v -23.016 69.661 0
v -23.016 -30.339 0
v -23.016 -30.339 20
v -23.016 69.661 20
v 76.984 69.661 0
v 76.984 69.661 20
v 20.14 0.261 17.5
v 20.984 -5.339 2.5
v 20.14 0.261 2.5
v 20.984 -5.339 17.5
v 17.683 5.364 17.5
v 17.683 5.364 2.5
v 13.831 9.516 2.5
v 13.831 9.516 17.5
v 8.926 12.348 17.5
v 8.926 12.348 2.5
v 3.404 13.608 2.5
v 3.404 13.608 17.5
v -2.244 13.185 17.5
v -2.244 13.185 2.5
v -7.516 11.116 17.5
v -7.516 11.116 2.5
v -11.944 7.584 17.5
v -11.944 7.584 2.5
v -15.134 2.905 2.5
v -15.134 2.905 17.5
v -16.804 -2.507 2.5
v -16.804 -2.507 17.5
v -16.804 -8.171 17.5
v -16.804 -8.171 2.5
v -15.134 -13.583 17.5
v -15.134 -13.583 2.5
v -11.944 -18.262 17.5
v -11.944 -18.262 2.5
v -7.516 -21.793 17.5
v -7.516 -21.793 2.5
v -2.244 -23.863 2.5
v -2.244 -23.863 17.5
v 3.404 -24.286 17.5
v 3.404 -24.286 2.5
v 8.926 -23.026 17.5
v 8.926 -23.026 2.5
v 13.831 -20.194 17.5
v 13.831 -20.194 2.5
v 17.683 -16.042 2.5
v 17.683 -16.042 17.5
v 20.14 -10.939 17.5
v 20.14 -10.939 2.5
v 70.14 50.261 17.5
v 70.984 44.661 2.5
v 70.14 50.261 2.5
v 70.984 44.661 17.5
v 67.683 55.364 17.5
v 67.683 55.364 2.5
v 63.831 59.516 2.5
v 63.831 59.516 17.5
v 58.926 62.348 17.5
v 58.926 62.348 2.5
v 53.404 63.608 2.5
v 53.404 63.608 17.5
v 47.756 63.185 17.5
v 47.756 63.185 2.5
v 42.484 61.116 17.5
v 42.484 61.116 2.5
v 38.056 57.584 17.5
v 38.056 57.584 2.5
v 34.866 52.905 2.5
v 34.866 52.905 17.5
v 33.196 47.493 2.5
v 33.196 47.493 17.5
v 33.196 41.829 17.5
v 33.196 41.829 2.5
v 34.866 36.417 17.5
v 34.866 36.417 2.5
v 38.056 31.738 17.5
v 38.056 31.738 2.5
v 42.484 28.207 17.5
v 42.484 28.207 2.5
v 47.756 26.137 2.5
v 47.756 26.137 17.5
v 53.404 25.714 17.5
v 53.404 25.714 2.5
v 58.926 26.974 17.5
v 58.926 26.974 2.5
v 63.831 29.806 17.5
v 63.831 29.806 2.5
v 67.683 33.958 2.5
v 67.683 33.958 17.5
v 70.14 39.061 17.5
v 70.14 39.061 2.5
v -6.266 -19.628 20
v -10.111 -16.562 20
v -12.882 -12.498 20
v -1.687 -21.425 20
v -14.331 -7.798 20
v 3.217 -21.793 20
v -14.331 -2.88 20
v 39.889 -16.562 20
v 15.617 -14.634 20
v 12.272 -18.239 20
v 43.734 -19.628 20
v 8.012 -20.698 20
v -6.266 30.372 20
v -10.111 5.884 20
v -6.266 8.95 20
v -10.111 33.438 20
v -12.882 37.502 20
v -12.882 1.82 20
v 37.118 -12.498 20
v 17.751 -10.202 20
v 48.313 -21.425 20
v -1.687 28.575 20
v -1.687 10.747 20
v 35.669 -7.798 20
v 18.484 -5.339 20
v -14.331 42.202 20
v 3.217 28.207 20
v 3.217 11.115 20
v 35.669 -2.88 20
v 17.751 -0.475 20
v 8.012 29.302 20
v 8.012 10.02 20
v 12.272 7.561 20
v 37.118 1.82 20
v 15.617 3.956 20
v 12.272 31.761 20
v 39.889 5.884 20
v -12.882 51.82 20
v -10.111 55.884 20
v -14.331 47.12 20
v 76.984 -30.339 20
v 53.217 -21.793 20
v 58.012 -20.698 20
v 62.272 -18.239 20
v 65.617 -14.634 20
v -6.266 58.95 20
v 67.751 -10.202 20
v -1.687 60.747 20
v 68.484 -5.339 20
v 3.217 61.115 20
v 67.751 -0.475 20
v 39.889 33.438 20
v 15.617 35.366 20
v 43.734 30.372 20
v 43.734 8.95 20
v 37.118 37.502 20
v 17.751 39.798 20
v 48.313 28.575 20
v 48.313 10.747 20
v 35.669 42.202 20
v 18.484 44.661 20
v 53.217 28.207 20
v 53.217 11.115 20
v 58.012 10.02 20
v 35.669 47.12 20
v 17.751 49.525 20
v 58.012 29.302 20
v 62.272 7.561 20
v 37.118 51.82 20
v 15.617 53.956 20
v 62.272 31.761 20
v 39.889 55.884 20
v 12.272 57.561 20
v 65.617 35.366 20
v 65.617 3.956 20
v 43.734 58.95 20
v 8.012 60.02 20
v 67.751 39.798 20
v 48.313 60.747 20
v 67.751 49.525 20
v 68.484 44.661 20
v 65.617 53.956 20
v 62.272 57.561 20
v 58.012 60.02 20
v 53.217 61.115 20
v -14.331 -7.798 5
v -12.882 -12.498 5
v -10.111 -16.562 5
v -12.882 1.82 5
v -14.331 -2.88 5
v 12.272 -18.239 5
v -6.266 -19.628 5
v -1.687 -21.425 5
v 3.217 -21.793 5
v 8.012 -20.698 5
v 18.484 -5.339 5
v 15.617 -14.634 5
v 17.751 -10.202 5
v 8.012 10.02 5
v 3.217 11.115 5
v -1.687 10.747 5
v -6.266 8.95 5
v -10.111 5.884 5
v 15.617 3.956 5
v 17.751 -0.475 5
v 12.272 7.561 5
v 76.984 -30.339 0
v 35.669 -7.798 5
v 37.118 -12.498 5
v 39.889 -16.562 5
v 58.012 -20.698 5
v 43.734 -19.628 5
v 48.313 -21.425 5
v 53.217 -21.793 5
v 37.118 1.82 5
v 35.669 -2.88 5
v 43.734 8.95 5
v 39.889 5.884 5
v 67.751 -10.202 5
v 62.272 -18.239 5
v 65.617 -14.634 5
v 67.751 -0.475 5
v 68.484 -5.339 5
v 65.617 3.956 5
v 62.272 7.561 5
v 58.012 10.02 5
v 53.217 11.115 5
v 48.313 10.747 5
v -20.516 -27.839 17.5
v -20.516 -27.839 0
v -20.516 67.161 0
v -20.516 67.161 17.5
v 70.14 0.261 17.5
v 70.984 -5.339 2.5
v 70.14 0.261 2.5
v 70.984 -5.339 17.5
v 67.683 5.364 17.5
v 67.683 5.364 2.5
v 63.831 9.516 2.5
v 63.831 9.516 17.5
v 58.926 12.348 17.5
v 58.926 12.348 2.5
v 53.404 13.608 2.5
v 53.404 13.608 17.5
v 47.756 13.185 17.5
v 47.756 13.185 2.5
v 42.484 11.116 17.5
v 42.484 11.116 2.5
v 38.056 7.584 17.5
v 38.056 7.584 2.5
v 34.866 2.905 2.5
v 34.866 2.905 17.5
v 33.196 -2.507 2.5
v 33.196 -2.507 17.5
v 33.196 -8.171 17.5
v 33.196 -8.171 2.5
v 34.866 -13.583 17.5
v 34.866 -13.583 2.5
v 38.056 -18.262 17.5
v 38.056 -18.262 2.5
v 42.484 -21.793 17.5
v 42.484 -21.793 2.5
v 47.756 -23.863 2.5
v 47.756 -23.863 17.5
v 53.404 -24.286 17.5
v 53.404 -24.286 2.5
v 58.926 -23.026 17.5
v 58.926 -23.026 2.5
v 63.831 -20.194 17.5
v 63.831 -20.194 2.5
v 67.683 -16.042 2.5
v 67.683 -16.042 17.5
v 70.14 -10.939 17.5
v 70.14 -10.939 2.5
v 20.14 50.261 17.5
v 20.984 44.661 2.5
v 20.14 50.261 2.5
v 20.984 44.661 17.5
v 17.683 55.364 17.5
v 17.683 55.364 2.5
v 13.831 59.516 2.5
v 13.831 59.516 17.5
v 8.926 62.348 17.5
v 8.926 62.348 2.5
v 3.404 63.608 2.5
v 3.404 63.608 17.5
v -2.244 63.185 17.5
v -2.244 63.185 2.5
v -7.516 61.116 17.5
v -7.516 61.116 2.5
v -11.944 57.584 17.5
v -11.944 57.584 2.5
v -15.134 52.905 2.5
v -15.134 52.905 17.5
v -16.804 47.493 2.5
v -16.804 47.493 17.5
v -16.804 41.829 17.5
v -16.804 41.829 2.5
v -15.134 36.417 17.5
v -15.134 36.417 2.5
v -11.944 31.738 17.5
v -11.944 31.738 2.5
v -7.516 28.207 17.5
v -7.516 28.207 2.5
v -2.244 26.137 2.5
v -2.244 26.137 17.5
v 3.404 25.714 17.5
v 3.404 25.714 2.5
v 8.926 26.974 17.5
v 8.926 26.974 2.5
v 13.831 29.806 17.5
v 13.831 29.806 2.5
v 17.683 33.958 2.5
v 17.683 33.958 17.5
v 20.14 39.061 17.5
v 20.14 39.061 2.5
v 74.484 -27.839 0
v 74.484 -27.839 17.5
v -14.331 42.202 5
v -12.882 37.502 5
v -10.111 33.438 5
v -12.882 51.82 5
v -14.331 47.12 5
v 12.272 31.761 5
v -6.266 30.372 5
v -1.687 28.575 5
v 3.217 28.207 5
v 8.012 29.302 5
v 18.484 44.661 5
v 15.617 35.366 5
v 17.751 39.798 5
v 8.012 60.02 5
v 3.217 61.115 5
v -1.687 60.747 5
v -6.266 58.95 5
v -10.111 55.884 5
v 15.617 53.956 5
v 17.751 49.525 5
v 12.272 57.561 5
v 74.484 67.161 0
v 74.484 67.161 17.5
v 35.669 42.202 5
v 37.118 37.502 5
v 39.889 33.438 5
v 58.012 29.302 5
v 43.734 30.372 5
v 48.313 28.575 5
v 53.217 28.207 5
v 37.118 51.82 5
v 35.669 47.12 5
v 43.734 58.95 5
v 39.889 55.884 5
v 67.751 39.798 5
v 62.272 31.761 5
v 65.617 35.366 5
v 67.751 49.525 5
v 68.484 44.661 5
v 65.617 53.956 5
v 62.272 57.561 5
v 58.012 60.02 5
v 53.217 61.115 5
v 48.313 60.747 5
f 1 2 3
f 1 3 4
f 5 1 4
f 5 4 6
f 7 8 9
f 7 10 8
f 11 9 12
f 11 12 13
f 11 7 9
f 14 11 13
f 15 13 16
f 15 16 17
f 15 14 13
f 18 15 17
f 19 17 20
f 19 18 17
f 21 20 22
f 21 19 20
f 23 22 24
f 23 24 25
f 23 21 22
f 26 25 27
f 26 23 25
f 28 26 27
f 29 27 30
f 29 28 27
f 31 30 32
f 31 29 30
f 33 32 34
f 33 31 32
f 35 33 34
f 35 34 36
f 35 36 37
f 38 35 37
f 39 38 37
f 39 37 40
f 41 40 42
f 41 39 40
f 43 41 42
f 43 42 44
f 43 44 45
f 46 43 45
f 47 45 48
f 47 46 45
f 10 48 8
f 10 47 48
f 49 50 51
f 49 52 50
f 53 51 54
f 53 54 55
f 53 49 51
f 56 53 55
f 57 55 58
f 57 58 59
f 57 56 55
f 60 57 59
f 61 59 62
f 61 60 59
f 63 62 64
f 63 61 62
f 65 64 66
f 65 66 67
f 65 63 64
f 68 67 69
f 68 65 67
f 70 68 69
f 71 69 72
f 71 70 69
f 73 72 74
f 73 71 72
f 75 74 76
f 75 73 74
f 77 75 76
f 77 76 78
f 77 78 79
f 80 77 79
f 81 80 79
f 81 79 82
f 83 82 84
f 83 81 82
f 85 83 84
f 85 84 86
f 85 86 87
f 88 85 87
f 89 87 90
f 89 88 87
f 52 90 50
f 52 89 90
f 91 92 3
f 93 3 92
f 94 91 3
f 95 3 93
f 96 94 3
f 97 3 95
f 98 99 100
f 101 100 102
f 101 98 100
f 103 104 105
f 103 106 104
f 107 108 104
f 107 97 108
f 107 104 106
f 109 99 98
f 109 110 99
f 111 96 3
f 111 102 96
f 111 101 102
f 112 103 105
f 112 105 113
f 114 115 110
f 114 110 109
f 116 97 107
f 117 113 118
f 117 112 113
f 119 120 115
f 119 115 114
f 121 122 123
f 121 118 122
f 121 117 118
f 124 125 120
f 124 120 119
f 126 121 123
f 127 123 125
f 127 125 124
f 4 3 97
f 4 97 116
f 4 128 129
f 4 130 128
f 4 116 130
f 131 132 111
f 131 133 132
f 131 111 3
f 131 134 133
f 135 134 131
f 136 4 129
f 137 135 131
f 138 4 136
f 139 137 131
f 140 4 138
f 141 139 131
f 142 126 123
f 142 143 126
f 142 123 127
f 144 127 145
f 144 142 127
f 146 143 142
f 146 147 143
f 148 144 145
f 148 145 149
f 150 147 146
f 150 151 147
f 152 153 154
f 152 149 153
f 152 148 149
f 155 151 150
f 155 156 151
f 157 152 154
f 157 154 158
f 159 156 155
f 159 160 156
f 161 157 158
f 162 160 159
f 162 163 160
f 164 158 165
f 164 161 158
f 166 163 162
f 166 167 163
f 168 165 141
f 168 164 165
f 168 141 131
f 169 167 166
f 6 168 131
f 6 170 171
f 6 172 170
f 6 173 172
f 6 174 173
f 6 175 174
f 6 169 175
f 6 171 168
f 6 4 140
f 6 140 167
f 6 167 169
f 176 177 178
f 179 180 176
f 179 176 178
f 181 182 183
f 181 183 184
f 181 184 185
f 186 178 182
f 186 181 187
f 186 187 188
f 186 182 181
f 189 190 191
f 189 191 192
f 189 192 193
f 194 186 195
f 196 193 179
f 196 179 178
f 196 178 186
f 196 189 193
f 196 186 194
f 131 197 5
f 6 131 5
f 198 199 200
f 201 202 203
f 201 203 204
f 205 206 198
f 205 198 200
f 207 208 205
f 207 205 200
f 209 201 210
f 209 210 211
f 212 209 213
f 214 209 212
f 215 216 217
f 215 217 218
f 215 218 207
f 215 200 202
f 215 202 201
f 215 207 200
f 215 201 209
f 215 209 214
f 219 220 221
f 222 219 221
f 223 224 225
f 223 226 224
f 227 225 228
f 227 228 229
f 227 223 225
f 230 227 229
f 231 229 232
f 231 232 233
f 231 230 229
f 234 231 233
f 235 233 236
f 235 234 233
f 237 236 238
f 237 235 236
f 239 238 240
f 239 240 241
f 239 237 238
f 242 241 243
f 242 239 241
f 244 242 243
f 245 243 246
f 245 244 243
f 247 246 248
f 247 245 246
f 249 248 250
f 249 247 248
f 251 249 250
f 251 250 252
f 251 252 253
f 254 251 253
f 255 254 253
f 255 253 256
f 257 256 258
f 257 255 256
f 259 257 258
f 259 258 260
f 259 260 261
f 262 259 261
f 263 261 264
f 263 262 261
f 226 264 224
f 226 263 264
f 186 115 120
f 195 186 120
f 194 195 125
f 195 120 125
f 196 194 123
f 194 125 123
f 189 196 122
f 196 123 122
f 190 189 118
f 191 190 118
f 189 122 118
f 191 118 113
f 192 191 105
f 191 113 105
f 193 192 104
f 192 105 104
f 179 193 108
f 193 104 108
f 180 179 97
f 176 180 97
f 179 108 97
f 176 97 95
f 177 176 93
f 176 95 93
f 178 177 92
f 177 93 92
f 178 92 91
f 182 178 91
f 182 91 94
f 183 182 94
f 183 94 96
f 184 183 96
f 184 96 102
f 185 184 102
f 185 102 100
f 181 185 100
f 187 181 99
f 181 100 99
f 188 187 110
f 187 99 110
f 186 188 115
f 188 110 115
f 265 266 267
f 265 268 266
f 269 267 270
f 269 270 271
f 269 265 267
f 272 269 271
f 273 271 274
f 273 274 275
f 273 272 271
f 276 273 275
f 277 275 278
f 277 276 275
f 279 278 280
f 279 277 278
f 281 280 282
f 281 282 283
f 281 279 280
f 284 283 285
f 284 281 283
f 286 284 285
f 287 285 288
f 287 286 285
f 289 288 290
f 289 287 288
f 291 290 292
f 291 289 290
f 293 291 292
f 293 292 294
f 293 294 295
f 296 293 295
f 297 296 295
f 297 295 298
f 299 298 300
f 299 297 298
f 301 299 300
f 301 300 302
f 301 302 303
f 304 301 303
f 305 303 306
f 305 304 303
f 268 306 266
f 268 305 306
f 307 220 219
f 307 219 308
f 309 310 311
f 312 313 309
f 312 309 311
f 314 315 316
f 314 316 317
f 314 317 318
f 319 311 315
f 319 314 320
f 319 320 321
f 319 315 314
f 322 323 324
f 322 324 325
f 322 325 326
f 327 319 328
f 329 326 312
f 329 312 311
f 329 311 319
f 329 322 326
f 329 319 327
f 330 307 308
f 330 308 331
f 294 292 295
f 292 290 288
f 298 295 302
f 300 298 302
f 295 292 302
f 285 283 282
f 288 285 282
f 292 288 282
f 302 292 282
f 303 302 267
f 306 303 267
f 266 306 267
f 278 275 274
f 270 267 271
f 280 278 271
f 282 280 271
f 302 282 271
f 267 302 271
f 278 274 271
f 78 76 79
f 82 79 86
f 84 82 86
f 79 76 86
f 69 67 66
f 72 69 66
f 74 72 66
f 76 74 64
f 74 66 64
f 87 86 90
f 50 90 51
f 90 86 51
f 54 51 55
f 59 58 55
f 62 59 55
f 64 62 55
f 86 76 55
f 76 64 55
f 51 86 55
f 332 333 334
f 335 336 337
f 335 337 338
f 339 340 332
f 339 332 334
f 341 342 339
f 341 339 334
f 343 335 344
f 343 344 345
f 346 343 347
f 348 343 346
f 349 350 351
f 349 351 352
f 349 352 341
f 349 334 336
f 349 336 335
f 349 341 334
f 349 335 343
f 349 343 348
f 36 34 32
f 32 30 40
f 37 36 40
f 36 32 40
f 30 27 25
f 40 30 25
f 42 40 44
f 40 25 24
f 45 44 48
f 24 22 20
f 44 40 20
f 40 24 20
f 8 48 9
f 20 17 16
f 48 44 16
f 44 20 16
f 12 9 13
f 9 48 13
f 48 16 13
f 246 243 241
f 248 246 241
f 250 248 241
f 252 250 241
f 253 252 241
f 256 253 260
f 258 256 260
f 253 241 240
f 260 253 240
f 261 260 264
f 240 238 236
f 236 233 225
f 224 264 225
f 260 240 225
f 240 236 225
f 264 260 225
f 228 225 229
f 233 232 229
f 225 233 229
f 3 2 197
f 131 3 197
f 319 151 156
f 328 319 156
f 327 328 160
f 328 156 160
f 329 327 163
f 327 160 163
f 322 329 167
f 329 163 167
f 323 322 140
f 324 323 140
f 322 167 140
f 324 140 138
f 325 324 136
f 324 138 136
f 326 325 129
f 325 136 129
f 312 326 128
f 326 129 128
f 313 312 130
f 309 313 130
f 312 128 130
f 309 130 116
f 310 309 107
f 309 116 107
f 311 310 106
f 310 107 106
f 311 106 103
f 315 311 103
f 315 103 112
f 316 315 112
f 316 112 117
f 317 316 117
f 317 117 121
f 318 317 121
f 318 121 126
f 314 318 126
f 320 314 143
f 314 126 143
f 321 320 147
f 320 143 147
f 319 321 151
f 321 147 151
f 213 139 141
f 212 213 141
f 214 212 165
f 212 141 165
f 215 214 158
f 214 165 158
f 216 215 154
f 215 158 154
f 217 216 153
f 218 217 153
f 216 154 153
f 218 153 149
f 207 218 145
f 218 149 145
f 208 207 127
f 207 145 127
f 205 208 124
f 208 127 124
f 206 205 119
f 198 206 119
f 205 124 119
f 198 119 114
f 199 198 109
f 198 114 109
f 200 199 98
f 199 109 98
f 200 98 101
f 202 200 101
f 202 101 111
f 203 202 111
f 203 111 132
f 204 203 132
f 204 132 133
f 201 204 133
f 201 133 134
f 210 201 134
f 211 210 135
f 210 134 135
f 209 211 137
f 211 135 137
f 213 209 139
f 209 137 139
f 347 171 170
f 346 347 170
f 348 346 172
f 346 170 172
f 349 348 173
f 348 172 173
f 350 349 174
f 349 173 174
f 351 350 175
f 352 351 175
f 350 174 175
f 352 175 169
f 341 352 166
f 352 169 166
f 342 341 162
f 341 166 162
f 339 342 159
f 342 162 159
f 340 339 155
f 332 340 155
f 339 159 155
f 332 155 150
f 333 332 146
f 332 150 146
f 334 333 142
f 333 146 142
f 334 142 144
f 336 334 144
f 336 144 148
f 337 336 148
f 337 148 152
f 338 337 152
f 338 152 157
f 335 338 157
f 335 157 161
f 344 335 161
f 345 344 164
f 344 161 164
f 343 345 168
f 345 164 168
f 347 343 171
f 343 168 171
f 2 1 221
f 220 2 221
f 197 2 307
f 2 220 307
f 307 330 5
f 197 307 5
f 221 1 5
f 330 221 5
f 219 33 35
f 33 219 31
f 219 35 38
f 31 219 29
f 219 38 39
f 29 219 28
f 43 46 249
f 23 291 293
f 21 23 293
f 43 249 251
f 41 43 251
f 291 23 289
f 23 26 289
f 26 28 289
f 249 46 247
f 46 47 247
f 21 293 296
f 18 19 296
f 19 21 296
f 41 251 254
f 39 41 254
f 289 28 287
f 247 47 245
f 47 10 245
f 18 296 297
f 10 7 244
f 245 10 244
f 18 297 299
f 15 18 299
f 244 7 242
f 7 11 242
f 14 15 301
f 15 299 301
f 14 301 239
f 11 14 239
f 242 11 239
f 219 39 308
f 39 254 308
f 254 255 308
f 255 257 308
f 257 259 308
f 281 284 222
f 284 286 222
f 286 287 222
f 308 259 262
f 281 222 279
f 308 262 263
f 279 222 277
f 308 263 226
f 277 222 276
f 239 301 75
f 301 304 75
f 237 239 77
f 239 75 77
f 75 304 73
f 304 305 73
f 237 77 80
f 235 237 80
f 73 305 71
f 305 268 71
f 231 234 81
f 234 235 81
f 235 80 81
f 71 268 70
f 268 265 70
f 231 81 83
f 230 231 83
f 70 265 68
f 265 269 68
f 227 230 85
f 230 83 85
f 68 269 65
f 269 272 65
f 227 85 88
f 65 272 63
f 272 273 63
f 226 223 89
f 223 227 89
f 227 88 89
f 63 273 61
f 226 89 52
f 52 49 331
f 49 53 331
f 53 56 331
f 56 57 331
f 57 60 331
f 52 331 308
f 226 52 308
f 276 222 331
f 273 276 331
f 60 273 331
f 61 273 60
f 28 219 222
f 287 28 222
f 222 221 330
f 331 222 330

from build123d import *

# Parameters (mm, degrees)
F0_W     = 100
F0_H     = 100
F1_DEPTH = 20
F2_R     = 16.5
F3_DEPTH = 15
F4_T     = -2.5


with BuildPart() as f1:
    # F0 (on Top) → F1 (new body)
    with BuildSketch(Plane.XY):
        with Locations((26.9842460752, 19.6610757008)):
            Rectangle(F0_W, F0_H)
    extrude(amount=F1_DEPTH)

    # F2 (on face) → F3 (cut)
    with BuildSketch(Plane.XY.offset(20)):
        with Locations((1.9842460752, 44.6610757008)):
            Circle(F2_R)
        with Locations((51.9842460752, 44.6610757008)):
            Circle(F2_R)
        with Locations((51.9842460752, -5.3389242992)):
            Circle(F2_R)
        with Locations((1.9842460752, -5.3389242992)):
            Circle(F2_R)
    extrude(amount=-F3_DEPTH, mode=Mode.SUBTRACT)

    # F4
    f4_openings = [f1.faces().sort_by_distance(p)[0] for p in [
        (26.984246, 19.661076, 0),
    ]]
    offset(amount=F4_T, openings=f4_openings, kind=Kind.INTERSECTION)


solid = f1.part
